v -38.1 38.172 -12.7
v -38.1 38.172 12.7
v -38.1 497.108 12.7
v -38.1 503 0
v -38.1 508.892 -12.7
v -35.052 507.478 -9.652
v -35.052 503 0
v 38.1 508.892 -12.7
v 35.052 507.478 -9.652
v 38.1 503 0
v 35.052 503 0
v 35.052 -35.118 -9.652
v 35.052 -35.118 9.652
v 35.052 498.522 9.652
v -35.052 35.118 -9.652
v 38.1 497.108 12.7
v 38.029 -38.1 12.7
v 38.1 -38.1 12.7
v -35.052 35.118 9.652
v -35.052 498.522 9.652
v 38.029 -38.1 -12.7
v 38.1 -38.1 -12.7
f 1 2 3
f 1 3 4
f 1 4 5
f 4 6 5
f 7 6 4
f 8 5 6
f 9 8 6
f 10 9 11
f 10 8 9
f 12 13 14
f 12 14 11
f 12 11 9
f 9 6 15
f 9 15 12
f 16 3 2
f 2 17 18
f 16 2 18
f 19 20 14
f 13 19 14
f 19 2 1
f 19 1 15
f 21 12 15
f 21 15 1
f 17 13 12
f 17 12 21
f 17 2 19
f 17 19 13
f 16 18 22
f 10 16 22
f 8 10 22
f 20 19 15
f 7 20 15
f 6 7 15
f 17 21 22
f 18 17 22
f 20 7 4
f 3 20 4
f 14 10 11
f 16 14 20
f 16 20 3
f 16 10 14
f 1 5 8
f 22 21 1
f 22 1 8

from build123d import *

# Parameters (mm, degrees)
SKETCH1_W               = 76.2
SKETCH1_H               = 25.4
SKETCH1_W_2             = 70.104
SKETCH1_H_2             = 19.304
BOSS_EXTRUDE1_DEPTH     = 503
SKETCH3_W               = 76.2
SKETCH3_H               = 25.4
SKETCH3_W_2             = 70.104
SKETCH3_H_2             = 19.304
BOSS_EXTRUDE2_DEPTH     = 38.1
CUT_EXTRUDE1_DEPTH      = 13.7
CUT_EXTRUDE1_DEPTH_BACK = 13.7
SKETCH4_W               = 76.2
SKETCH4_H               = 25.4
SKETCH4_W_2             = 70.104
SKETCH4_H_2             = 19.304
BOSS_EXTRUDE3_DEPTH     = 38.1
CUT_EXTRUDE4_DEPTH      = 77.2


with BuildPart() as part:
    # Sketch1 → Boss-Extrude1 (new body)
    with BuildSketch(Plane(origin=(0, 0, 0), x_dir=(1, 0, 0), z_dir=(0, 1, 0))):
        Rectangle(SKETCH1_W, SKETCH1_H)
        Rectangle(SKETCH1_W_2, SKETCH1_H_2, mode=Mode.SUBTRACT)
    extrude(amount=BOSS_EXTRUDE1_DEPTH)

    # Sketch3 → Boss-Extrude2 (add)
    with BuildSketch(Plane.XZ):
        Rectangle(SKETCH3_W, SKETCH3_H)
        Rectangle(SKETCH3_W_2, SKETCH3_H_2, mode=Mode.SUBTRACT)
    extrude(amount=BOSS_EXTRUDE2_DEPTH)

    # Sketch5 → Cut-Extrude1 (cut, two sides)
    with BuildSketch(Plane(origin=(0, 0.04766681, 0), x_dir=(0, -1, 0), z_dir=(0, 0, -1))) as cut_extrude1_sk:
        Polygon((-54.539816916, 54.485087066), (43.408433109, -43.279429016), (134.538834899, 48.02223888), (36.590584874, 145.786754963), align=None)
    extrude(amount=CUT_EXTRUDE1_DEPTH, mode=Mode.SUBTRACT)
    extrude(cut_extrude1_sk.sketch, amount=-CUT_EXTRUDE1_DEPTH_BACK, mode=Mode.SUBTRACT)

    # Sketch4 → Boss-Extrude3 (add)
    with BuildSketch(Plane(origin=(0, 503, 0), x_dir=(1, 0, 0), z_dir=(0, 1, 0))):
        Rectangle(SKETCH4_W, SKETCH4_H)
        Rectangle(SKETCH4_W_2, SKETCH4_H_2, mode=Mode.SUBTRACT)
    extrude(amount=BOSS_EXTRUDE3_DEPTH)

    # Sketch7 → Cut-Extrude4 (cut, through all)
    with BuildSketch(Plane(origin=(38.1, 0, 0), x_dir=(0, 0, -1), z_dir=(1, 0, 0))):
        Polygon((0, 503), (-33.872693161, 487.286257), (-33.967674724, 580.672666523), (15.906824851, 602.541381241), (53.592410045, 527.861836472), align=None)
    extrude(amount=-CUT_EXTRUDE4_DEPTH, mode=Mode.SUBTRACT)


solid = part.part
